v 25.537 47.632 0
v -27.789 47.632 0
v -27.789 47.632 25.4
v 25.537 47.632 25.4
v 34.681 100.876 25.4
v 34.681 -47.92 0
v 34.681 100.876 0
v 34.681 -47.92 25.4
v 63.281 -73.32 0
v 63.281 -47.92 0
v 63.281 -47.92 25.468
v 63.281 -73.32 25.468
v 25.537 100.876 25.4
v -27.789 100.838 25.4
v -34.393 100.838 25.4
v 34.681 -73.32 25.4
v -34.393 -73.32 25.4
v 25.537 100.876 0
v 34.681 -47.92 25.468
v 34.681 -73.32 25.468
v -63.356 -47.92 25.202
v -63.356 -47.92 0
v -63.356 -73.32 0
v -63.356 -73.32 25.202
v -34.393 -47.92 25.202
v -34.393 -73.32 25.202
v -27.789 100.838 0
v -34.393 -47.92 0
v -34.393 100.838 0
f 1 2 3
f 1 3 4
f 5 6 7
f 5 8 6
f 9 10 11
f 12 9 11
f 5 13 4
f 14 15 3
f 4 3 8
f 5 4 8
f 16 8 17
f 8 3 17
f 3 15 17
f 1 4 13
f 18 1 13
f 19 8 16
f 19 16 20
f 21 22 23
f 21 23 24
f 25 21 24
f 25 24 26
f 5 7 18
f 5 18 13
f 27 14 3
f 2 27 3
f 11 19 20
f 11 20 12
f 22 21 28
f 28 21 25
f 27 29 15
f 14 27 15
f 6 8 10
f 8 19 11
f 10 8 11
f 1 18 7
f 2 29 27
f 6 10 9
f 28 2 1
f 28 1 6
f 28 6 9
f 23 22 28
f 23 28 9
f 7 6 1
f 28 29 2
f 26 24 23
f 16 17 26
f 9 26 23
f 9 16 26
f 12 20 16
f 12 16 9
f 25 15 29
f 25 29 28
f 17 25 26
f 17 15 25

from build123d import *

# Parameters (mm, degrees)
F0_W     = 69.0733827651
F0_H     = 95.5515131354
F1_DEPTH = 25.4
F2_W     = 28.6007858813
F2_H     = 25.4682730883
F2_W_2   = 28.9632454515
F2_H_2   = 25.2022650093
F3_DEPTH = 25.4
F4_W     = 53.2440617681
F4_H     = 25.4
F5_DEPTH = 9.144
F6_W     = 53.2063767314
F6_H     = 25.4
F7_DEPTH = 6.604


with BuildPart() as f1:
    # F0 (on Top) → F1 (new body)
    with BuildSketch(Plane.XY):
        with Locations((0.1439023763, -0.1439042389)):
            Rectangle(F0_W, F0_H)
    extrude(amount=F1_DEPTH)

    # F2 (on face) → F3 (join)
    with BuildSketch(Plane.XZ.offset(47.9196608067)):
        with Locations((48.9809866995, 12.7341365442)):
            Rectangle(F2_W, F2_H)
        with Locations((-48.874411732, 12.6011325046)):
            Rectangle(F2_W_2, F2_H_2)
        Polygon((-34.3927890062, 0), (34.6805937588, 0), (34.6805937588, 25.4), (-34.3927890062, 25.4), (-34.3927890062, 25.2022650093), align=None)
    extrude(amount=F3_DEPTH)

    # F4 (on face) → F5 (join)
    with BuildSketch(Plane.YZ.offset(34.6805937588)):
        with Locations((74.2538832128, 12.7)):
            Rectangle(F4_W, F4_H)
    extrude(amount=-F5_DEPTH)

    # F6 (on face) → F7 (join)
    with BuildSketch(Plane(origin=(-34.3927890062, 0, 0), x_dir=(0, -1, 0), z_dir=(-1, 0, 0))):
        with Locations((-74.2350406945, 12.7)):
            Rectangle(F6_W, F6_H)
    extrude(amount=-F7_DEPTH)


solid = f1.part
